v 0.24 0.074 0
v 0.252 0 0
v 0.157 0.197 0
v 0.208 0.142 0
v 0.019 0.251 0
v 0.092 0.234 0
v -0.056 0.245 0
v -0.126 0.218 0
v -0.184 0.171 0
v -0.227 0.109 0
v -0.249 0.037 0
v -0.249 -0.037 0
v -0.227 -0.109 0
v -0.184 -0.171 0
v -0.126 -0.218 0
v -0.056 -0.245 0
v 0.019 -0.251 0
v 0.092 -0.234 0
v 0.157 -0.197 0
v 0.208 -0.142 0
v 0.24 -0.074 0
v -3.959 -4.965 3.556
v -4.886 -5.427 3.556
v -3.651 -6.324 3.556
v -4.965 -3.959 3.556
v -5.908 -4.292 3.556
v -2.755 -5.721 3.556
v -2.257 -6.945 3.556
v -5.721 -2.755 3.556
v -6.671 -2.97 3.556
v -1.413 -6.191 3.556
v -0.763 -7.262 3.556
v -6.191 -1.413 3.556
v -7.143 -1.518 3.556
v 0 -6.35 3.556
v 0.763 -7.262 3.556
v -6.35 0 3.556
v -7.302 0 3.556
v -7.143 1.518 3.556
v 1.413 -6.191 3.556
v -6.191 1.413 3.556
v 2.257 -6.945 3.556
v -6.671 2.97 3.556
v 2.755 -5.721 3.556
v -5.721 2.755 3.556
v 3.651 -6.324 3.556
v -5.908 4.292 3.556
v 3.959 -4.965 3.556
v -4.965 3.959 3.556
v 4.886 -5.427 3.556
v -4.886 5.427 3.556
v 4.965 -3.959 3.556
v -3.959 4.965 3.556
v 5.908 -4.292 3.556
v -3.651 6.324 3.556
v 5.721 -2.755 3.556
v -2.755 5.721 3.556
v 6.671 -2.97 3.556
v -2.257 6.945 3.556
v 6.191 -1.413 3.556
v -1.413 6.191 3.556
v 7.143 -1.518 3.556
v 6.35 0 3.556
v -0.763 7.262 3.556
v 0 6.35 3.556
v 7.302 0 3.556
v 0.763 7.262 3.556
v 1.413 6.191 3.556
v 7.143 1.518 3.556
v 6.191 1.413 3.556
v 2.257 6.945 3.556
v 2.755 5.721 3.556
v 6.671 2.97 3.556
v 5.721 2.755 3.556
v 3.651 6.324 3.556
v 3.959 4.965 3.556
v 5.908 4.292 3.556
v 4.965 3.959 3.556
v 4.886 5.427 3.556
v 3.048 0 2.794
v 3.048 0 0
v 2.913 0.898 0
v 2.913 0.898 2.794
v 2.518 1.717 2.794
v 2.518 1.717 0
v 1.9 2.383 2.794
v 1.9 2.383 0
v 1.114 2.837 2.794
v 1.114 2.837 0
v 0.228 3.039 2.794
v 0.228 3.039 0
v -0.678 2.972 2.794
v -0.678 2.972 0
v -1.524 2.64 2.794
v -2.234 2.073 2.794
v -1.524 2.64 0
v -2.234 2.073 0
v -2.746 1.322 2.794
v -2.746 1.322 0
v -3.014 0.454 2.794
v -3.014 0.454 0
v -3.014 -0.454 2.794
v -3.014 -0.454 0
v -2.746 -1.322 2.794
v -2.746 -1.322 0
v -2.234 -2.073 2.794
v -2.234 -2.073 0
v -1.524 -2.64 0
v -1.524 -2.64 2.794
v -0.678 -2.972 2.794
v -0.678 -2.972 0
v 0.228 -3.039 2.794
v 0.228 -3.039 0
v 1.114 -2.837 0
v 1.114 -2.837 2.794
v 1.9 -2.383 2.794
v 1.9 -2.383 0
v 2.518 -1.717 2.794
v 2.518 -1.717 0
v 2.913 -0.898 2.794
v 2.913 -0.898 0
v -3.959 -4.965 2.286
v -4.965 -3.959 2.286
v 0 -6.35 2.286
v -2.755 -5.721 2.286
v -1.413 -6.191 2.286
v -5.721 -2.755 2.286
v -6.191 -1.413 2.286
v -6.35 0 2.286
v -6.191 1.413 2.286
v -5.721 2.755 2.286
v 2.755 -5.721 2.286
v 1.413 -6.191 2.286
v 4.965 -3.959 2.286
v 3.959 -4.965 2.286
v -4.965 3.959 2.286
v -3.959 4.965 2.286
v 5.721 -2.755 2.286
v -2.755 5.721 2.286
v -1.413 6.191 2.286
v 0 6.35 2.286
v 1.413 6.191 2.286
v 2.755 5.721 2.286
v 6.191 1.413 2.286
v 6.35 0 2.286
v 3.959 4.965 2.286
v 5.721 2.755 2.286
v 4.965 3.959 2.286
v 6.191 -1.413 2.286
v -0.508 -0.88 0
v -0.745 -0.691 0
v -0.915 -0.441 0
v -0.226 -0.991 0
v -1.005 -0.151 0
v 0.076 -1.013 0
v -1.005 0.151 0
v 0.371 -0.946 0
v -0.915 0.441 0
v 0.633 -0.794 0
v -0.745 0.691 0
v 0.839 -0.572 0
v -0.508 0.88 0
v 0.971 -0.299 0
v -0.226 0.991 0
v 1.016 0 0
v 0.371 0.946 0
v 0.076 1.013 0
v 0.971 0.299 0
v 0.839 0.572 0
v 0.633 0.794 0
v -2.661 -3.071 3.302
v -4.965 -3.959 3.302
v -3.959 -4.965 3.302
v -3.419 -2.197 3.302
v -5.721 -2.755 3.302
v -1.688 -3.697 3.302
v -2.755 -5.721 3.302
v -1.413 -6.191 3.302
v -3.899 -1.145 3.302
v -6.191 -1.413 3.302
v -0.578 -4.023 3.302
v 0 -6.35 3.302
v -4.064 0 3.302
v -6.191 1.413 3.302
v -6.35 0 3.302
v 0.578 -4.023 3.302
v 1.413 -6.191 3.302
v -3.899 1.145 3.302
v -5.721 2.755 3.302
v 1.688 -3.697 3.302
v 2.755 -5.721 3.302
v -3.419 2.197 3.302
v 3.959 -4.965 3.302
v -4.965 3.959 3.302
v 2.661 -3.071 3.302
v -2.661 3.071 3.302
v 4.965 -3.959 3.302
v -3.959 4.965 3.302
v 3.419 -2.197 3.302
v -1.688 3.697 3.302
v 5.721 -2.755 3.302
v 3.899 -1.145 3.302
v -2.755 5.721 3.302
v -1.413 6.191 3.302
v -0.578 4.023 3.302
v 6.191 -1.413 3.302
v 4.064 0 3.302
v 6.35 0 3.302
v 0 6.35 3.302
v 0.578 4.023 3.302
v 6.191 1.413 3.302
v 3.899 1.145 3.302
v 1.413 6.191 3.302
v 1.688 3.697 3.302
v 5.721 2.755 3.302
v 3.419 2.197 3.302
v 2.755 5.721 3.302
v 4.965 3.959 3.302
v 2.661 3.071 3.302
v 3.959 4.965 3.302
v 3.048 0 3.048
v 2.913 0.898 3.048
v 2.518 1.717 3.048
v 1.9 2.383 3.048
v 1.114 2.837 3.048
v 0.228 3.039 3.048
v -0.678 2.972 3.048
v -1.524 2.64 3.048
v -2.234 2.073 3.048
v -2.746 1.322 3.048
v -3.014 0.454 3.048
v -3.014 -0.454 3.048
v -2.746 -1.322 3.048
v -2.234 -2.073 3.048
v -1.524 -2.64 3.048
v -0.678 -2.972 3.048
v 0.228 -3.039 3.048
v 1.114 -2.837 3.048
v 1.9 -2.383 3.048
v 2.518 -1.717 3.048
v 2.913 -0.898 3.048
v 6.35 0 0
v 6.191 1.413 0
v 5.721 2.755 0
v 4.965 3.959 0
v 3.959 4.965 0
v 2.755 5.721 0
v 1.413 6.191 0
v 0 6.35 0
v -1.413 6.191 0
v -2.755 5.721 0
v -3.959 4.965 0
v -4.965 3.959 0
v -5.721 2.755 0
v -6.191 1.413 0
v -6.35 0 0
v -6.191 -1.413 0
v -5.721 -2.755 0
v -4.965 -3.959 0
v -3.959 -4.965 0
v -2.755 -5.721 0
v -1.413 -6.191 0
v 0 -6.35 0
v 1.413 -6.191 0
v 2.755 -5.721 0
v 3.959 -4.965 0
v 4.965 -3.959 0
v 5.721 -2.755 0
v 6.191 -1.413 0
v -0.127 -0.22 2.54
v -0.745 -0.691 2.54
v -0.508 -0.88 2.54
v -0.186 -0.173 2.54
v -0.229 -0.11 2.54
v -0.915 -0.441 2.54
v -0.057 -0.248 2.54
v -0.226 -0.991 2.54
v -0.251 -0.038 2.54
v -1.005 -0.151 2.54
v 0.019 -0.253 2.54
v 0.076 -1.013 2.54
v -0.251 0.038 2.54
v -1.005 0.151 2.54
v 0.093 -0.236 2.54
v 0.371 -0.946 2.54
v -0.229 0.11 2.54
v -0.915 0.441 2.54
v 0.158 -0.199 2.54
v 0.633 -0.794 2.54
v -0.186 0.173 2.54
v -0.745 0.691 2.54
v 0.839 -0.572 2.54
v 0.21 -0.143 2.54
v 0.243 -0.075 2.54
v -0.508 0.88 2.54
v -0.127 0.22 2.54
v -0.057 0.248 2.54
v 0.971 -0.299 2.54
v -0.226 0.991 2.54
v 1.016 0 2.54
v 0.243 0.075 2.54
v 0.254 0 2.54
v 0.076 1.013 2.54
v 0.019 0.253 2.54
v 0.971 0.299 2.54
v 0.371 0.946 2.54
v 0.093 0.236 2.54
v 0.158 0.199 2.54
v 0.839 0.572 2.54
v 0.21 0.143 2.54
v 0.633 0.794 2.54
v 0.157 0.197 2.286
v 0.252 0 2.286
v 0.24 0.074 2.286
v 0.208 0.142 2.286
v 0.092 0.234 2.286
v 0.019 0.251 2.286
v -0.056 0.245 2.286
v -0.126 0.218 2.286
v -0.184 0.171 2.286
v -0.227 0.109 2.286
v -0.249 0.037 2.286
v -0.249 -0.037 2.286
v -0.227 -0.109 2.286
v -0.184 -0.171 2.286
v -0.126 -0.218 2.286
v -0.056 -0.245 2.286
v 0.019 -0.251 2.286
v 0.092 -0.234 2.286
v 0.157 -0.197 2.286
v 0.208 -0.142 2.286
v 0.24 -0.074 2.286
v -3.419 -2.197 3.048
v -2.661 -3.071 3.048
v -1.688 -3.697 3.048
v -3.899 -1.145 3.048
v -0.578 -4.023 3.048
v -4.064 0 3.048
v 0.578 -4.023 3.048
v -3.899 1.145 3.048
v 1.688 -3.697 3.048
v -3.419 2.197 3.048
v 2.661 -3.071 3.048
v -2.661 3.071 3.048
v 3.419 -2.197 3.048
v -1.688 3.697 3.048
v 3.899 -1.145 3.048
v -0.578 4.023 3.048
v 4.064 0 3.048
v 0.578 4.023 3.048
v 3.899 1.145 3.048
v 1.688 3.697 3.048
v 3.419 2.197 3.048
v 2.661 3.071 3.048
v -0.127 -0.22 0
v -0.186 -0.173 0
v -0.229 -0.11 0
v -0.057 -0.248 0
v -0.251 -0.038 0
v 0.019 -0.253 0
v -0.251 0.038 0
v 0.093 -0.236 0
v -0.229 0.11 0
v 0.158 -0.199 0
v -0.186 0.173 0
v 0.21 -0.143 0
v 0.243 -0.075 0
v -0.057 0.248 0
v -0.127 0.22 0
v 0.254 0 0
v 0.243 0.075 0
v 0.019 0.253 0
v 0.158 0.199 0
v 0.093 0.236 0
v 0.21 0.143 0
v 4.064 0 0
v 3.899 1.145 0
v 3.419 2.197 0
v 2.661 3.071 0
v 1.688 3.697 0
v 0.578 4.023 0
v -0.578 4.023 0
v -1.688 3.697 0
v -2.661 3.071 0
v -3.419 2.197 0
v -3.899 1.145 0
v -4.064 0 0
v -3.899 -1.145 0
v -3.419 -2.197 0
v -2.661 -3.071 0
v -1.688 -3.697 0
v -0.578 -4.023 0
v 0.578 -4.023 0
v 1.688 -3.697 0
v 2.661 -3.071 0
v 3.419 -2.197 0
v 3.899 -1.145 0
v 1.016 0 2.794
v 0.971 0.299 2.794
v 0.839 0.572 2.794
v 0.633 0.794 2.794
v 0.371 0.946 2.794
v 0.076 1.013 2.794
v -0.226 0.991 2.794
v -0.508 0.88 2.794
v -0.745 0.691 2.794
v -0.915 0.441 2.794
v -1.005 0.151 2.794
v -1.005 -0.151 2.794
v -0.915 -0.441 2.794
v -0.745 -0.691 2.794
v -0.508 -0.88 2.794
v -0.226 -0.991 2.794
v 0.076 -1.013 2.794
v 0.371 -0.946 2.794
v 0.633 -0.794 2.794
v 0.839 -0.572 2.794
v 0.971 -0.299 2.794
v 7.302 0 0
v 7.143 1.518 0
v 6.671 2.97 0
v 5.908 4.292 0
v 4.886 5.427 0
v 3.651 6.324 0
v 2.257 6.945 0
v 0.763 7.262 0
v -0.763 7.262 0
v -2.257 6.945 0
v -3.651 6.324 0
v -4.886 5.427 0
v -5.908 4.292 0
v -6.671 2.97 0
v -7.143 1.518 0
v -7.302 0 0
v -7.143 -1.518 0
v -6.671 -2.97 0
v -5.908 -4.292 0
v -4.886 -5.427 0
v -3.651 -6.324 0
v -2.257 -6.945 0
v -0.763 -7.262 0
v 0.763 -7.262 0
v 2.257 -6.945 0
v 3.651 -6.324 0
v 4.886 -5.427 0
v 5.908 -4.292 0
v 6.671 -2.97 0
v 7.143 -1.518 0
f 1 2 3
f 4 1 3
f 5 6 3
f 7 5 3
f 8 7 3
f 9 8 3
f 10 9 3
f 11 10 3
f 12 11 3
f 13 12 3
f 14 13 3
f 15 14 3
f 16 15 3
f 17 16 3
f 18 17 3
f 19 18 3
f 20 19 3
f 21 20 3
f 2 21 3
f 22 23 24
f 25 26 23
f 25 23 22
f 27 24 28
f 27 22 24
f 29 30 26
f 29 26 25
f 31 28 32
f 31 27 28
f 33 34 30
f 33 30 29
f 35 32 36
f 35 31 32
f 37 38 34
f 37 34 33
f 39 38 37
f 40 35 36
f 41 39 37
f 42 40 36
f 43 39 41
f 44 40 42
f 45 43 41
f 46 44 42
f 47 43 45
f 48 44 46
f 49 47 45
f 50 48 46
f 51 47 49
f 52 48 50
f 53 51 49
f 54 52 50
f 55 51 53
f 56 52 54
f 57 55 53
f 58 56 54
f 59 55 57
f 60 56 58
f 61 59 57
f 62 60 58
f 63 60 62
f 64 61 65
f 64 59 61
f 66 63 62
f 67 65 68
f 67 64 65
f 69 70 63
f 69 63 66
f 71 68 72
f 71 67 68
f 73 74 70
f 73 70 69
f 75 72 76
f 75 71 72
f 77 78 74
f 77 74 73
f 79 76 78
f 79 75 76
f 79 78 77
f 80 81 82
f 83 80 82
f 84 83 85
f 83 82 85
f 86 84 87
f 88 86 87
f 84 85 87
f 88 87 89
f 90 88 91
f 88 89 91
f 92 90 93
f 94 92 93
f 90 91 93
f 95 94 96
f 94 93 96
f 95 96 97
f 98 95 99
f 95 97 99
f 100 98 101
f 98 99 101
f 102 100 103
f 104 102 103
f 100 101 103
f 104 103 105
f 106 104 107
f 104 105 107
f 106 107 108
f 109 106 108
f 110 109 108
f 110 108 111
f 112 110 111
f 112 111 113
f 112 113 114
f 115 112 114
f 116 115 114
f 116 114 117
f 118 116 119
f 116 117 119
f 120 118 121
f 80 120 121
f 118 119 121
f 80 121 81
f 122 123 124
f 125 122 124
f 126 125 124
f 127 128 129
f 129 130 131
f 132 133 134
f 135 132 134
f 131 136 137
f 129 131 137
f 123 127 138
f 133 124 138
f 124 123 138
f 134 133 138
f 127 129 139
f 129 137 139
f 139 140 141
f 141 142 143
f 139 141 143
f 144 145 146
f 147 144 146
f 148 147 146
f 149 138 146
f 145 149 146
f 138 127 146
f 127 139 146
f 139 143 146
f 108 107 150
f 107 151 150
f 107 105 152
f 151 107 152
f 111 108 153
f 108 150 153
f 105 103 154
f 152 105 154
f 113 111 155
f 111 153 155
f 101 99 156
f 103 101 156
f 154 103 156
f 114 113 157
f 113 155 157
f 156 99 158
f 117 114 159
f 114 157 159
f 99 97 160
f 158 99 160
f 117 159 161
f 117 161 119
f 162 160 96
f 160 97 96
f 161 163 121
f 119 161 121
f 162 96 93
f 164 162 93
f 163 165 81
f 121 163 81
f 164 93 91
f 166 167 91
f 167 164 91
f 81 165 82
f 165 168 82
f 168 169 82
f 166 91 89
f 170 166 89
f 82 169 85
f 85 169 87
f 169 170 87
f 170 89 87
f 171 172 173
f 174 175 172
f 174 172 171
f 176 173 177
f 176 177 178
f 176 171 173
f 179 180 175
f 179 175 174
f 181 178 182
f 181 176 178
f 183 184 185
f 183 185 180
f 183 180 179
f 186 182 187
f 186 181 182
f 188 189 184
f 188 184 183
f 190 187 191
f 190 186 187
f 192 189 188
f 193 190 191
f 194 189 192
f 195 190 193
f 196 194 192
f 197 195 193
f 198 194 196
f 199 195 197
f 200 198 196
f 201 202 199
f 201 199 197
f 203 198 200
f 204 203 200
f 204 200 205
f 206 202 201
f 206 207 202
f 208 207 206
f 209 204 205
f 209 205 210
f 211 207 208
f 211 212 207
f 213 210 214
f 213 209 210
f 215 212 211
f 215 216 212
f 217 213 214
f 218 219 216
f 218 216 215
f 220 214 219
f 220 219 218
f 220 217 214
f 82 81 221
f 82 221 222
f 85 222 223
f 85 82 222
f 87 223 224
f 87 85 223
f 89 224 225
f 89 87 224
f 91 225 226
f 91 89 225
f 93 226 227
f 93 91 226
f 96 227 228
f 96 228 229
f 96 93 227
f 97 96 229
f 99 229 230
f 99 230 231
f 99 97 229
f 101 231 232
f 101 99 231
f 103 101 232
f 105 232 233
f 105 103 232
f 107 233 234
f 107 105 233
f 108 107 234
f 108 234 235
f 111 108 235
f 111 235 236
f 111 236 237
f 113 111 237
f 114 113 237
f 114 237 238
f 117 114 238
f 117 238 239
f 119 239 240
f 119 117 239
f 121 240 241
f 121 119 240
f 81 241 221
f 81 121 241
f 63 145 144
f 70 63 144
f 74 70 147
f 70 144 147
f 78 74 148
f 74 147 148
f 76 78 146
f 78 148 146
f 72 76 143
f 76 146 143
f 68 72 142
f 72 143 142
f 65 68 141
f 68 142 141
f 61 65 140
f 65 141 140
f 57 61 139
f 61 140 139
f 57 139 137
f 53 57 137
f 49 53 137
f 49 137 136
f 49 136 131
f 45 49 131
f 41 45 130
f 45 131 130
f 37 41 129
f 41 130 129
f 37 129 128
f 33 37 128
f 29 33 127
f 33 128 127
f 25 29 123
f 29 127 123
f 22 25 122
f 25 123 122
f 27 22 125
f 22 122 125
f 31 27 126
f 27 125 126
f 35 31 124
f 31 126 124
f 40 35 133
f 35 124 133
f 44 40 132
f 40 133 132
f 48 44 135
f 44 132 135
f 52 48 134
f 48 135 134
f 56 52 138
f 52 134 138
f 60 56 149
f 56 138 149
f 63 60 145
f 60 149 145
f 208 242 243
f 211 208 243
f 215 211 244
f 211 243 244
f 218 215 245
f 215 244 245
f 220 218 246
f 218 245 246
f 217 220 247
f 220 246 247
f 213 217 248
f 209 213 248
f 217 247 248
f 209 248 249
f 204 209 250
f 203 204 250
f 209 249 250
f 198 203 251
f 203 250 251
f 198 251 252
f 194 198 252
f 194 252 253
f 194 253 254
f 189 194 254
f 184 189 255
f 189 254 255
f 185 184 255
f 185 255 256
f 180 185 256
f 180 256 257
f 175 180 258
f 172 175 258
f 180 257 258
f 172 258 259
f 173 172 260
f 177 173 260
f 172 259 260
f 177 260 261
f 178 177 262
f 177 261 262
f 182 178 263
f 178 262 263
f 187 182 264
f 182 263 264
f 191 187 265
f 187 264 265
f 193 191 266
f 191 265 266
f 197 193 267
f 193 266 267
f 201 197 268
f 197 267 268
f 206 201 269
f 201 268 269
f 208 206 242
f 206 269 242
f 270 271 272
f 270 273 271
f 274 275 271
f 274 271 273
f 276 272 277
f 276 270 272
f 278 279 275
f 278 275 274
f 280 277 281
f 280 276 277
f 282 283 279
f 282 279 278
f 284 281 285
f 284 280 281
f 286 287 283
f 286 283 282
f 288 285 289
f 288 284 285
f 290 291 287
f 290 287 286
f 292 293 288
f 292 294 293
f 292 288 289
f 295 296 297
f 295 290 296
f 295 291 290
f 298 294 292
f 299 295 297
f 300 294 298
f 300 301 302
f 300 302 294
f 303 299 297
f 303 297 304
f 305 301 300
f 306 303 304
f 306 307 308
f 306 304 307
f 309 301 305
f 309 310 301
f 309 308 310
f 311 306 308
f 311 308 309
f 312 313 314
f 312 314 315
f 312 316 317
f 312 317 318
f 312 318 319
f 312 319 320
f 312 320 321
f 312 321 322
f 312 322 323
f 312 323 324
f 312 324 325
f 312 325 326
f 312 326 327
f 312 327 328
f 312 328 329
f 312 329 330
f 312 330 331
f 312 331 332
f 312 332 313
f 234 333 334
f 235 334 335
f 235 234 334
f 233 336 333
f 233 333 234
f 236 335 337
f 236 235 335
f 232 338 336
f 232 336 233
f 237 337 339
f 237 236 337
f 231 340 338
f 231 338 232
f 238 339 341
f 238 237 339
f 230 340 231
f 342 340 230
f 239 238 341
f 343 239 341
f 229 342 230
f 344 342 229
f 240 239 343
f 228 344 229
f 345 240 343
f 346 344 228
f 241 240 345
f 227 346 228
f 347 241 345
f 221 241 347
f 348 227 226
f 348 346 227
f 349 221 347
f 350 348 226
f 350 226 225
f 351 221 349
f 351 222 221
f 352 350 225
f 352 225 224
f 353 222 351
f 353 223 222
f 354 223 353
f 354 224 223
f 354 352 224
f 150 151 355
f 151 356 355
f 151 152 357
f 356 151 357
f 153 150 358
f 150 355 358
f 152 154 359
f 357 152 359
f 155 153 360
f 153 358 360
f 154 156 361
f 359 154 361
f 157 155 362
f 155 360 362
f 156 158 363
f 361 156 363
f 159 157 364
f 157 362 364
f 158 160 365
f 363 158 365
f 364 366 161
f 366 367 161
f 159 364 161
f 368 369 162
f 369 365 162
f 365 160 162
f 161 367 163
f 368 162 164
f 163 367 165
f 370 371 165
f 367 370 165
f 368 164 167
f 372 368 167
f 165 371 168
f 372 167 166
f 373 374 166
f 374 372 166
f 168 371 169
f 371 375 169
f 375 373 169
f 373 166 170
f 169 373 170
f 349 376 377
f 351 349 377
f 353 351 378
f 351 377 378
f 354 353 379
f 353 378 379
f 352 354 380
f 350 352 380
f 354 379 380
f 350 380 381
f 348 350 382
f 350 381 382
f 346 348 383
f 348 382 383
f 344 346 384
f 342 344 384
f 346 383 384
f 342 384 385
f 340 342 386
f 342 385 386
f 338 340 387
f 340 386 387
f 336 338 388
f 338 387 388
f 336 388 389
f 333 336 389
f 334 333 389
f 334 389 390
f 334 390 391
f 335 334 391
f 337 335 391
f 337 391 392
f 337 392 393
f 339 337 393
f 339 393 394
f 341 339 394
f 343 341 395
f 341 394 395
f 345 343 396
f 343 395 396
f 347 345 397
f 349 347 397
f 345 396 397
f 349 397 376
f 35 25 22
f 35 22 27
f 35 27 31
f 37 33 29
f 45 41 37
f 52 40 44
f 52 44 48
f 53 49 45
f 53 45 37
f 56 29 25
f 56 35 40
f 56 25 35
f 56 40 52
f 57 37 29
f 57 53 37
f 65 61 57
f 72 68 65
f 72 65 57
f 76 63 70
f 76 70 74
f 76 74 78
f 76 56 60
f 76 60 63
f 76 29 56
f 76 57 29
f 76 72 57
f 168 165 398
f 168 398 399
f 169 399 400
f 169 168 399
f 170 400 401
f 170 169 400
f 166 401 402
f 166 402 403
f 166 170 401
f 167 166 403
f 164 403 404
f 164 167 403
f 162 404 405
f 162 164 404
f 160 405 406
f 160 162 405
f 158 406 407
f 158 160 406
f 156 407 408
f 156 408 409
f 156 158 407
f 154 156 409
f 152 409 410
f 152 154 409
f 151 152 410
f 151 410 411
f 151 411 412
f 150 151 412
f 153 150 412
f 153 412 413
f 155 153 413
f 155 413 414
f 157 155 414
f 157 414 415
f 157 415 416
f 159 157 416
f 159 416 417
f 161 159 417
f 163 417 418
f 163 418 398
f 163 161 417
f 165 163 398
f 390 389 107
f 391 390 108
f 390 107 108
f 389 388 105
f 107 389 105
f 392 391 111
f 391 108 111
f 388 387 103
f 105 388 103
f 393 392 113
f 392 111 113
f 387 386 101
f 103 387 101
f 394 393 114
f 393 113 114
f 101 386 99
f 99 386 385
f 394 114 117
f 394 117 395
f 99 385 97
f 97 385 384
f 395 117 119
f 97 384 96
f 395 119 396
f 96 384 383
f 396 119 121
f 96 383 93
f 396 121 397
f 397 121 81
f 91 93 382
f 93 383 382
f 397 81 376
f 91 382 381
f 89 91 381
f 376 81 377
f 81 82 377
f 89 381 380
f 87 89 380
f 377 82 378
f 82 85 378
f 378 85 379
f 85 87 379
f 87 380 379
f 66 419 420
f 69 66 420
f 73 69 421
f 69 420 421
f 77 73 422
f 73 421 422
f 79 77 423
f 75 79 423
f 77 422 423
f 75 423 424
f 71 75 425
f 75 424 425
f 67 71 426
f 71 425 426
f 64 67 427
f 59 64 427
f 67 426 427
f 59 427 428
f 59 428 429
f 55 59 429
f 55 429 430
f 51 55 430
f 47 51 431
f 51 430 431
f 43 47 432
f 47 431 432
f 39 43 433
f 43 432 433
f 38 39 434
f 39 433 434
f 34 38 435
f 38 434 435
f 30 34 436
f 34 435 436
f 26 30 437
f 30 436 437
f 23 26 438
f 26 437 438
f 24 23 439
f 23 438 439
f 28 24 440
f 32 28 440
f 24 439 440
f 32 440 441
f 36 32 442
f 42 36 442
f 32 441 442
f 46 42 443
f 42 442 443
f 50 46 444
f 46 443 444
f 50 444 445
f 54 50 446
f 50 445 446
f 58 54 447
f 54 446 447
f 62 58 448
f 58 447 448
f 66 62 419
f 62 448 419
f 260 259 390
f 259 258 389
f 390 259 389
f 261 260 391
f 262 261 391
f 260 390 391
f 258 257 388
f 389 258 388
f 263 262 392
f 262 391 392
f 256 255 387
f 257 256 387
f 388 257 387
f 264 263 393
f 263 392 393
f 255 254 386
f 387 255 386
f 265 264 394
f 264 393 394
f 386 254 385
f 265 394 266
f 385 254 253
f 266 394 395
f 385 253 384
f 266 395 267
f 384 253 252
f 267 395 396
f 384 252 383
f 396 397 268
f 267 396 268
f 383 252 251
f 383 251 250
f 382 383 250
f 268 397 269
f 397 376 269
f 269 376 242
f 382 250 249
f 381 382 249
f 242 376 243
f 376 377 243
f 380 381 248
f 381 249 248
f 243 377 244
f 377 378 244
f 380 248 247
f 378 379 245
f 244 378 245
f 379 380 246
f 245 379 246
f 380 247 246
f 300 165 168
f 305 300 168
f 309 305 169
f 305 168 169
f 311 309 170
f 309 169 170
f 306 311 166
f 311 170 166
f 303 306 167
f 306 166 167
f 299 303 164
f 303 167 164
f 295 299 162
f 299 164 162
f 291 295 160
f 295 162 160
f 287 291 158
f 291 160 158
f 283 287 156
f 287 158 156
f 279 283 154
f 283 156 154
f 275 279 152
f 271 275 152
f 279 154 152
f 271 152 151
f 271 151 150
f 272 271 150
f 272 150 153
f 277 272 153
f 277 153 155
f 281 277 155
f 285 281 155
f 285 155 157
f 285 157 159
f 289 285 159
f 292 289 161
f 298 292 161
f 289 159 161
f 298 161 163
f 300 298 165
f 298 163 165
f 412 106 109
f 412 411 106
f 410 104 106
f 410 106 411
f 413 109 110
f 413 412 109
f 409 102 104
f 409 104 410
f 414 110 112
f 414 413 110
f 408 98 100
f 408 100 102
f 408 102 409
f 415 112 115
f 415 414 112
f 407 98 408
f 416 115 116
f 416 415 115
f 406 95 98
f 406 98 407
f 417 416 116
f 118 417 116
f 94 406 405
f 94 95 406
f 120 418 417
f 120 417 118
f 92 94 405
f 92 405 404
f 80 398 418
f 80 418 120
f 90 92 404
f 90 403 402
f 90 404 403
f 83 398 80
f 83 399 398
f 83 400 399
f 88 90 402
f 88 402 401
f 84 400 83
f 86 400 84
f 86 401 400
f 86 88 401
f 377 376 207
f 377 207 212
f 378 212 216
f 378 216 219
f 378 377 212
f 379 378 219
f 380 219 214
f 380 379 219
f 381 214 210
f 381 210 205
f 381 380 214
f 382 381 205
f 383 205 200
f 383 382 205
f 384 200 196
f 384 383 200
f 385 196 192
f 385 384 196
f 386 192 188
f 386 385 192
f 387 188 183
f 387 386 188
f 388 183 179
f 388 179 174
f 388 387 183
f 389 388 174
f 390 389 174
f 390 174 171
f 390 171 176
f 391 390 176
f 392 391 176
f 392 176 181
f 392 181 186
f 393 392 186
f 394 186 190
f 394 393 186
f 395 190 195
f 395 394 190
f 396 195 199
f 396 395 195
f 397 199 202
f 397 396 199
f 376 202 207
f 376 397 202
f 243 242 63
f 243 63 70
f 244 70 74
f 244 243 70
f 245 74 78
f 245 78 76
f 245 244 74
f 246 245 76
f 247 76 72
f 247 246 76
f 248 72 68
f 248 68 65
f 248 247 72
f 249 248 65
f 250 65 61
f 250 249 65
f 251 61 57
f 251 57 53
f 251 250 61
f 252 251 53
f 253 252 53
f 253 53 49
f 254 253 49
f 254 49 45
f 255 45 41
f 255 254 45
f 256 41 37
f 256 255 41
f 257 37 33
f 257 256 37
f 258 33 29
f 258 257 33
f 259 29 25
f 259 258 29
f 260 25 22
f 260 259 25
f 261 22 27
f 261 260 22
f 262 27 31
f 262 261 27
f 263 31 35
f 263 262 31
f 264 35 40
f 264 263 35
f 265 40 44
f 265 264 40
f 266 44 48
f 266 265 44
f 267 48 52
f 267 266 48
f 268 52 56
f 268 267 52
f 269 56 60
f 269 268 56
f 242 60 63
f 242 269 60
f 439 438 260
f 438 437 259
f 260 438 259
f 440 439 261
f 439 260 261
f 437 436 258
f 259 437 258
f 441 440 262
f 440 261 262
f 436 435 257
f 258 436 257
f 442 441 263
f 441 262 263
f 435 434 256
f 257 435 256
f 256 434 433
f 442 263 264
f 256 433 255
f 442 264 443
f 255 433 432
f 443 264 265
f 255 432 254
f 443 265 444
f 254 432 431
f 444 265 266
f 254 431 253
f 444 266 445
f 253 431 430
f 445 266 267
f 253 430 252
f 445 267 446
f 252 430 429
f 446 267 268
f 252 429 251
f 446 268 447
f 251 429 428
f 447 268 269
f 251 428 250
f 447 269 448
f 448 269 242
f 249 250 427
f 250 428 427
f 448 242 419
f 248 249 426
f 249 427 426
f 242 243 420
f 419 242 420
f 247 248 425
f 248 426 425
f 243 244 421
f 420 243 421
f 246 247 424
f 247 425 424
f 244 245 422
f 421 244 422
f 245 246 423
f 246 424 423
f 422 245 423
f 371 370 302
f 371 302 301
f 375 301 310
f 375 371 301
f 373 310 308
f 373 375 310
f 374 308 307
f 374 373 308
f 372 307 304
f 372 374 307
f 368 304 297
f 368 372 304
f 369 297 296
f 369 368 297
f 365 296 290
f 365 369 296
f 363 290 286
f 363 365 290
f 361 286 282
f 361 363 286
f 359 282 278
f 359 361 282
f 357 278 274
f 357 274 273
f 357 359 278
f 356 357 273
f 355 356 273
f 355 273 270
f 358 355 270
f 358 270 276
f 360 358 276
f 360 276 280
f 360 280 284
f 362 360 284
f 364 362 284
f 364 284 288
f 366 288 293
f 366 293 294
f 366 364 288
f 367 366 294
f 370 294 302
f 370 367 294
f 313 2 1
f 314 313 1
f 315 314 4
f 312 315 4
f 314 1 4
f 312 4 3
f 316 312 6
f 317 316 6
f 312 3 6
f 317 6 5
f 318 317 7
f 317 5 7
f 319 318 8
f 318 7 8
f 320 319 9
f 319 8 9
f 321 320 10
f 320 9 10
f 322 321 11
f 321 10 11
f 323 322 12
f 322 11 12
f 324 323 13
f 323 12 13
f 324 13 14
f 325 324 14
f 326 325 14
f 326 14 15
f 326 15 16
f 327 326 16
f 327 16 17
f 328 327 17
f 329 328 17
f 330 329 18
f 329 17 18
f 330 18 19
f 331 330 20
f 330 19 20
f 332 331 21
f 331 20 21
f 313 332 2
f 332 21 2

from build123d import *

# Parameters (mm, degrees)
F1_R      = 7.3025
F1_R_2    = 6.35
F2_DEPTH  = 3.556
F4_R      = 6.35
F4_R_2    = 4.064
F5_DEPTH  = 3.302
F7_R      = 4.064
F7_R_2    = 3.048
F8_DEPTH  = 3.048
F10_R     = 3.048
F10_R_2   = 1.016
F11_DEPTH = 2.794
F13_R     = 1.016
F13_R_2   = 0.254
F14_DEPTH = 2.54
F15_R     = 0.2515062582
F16_DEPTH = 2.286
F17_R     = 6.35
F18_DEPTH = 1.27


with BuildPart() as f2:
    # F1 (on face) → F2 (new body)
    with BuildSketch(Plane.XY):
        Circle(F1_R)
        Circle(F1_R_2, mode=Mode.SUBTRACT)
    extrude(amount=F2_DEPTH)


with BuildPart() as f5:
    # F4 (on face) → F5 (new body)
    with BuildSketch(Plane.XY):
        Circle(F4_R)
        Circle(F4_R_2, mode=Mode.SUBTRACT)
    extrude(amount=F5_DEPTH)


with BuildPart() as f8:
    # F7 (on face) → F8 (new body)
    with BuildSketch(Plane.XY):
        Circle(F7_R)
        Circle(F7_R_2, mode=Mode.SUBTRACT)
    extrude(amount=F8_DEPTH)


with BuildPart() as f11:
    # F10 (on face) → F11 (new body)
    with BuildSketch(Plane.XY):
        Circle(F10_R)
        Circle(F10_R_2, mode=Mode.SUBTRACT)
    extrude(amount=F11_DEPTH)


with BuildPart() as f14:
    # F13 (on face) → F14 (new body)
    with BuildSketch(Plane.XY):
        Circle(F13_R)
        Circle(F13_R_2, mode=Mode.SUBTRACT)
    extrude(amount=F14_DEPTH)


with BuildPart() as f16:
    # F15 (on Top) → F16 (new body)
    with BuildSketch(Plane.XY):
        Circle(F15_R)
    extrude(amount=F16_DEPTH)


with BuildPart() as f18:
    # F17 (on face) → F18 (new body)
    with BuildSketch(Plane.XY.offset(2.286)):
        Circle(F17_R)
    extrude(amount=F18_DEPTH)


solid = Compound([f2.part, f5.part, f8.part, f11.part, f14.part, f16.part, f18.part])
